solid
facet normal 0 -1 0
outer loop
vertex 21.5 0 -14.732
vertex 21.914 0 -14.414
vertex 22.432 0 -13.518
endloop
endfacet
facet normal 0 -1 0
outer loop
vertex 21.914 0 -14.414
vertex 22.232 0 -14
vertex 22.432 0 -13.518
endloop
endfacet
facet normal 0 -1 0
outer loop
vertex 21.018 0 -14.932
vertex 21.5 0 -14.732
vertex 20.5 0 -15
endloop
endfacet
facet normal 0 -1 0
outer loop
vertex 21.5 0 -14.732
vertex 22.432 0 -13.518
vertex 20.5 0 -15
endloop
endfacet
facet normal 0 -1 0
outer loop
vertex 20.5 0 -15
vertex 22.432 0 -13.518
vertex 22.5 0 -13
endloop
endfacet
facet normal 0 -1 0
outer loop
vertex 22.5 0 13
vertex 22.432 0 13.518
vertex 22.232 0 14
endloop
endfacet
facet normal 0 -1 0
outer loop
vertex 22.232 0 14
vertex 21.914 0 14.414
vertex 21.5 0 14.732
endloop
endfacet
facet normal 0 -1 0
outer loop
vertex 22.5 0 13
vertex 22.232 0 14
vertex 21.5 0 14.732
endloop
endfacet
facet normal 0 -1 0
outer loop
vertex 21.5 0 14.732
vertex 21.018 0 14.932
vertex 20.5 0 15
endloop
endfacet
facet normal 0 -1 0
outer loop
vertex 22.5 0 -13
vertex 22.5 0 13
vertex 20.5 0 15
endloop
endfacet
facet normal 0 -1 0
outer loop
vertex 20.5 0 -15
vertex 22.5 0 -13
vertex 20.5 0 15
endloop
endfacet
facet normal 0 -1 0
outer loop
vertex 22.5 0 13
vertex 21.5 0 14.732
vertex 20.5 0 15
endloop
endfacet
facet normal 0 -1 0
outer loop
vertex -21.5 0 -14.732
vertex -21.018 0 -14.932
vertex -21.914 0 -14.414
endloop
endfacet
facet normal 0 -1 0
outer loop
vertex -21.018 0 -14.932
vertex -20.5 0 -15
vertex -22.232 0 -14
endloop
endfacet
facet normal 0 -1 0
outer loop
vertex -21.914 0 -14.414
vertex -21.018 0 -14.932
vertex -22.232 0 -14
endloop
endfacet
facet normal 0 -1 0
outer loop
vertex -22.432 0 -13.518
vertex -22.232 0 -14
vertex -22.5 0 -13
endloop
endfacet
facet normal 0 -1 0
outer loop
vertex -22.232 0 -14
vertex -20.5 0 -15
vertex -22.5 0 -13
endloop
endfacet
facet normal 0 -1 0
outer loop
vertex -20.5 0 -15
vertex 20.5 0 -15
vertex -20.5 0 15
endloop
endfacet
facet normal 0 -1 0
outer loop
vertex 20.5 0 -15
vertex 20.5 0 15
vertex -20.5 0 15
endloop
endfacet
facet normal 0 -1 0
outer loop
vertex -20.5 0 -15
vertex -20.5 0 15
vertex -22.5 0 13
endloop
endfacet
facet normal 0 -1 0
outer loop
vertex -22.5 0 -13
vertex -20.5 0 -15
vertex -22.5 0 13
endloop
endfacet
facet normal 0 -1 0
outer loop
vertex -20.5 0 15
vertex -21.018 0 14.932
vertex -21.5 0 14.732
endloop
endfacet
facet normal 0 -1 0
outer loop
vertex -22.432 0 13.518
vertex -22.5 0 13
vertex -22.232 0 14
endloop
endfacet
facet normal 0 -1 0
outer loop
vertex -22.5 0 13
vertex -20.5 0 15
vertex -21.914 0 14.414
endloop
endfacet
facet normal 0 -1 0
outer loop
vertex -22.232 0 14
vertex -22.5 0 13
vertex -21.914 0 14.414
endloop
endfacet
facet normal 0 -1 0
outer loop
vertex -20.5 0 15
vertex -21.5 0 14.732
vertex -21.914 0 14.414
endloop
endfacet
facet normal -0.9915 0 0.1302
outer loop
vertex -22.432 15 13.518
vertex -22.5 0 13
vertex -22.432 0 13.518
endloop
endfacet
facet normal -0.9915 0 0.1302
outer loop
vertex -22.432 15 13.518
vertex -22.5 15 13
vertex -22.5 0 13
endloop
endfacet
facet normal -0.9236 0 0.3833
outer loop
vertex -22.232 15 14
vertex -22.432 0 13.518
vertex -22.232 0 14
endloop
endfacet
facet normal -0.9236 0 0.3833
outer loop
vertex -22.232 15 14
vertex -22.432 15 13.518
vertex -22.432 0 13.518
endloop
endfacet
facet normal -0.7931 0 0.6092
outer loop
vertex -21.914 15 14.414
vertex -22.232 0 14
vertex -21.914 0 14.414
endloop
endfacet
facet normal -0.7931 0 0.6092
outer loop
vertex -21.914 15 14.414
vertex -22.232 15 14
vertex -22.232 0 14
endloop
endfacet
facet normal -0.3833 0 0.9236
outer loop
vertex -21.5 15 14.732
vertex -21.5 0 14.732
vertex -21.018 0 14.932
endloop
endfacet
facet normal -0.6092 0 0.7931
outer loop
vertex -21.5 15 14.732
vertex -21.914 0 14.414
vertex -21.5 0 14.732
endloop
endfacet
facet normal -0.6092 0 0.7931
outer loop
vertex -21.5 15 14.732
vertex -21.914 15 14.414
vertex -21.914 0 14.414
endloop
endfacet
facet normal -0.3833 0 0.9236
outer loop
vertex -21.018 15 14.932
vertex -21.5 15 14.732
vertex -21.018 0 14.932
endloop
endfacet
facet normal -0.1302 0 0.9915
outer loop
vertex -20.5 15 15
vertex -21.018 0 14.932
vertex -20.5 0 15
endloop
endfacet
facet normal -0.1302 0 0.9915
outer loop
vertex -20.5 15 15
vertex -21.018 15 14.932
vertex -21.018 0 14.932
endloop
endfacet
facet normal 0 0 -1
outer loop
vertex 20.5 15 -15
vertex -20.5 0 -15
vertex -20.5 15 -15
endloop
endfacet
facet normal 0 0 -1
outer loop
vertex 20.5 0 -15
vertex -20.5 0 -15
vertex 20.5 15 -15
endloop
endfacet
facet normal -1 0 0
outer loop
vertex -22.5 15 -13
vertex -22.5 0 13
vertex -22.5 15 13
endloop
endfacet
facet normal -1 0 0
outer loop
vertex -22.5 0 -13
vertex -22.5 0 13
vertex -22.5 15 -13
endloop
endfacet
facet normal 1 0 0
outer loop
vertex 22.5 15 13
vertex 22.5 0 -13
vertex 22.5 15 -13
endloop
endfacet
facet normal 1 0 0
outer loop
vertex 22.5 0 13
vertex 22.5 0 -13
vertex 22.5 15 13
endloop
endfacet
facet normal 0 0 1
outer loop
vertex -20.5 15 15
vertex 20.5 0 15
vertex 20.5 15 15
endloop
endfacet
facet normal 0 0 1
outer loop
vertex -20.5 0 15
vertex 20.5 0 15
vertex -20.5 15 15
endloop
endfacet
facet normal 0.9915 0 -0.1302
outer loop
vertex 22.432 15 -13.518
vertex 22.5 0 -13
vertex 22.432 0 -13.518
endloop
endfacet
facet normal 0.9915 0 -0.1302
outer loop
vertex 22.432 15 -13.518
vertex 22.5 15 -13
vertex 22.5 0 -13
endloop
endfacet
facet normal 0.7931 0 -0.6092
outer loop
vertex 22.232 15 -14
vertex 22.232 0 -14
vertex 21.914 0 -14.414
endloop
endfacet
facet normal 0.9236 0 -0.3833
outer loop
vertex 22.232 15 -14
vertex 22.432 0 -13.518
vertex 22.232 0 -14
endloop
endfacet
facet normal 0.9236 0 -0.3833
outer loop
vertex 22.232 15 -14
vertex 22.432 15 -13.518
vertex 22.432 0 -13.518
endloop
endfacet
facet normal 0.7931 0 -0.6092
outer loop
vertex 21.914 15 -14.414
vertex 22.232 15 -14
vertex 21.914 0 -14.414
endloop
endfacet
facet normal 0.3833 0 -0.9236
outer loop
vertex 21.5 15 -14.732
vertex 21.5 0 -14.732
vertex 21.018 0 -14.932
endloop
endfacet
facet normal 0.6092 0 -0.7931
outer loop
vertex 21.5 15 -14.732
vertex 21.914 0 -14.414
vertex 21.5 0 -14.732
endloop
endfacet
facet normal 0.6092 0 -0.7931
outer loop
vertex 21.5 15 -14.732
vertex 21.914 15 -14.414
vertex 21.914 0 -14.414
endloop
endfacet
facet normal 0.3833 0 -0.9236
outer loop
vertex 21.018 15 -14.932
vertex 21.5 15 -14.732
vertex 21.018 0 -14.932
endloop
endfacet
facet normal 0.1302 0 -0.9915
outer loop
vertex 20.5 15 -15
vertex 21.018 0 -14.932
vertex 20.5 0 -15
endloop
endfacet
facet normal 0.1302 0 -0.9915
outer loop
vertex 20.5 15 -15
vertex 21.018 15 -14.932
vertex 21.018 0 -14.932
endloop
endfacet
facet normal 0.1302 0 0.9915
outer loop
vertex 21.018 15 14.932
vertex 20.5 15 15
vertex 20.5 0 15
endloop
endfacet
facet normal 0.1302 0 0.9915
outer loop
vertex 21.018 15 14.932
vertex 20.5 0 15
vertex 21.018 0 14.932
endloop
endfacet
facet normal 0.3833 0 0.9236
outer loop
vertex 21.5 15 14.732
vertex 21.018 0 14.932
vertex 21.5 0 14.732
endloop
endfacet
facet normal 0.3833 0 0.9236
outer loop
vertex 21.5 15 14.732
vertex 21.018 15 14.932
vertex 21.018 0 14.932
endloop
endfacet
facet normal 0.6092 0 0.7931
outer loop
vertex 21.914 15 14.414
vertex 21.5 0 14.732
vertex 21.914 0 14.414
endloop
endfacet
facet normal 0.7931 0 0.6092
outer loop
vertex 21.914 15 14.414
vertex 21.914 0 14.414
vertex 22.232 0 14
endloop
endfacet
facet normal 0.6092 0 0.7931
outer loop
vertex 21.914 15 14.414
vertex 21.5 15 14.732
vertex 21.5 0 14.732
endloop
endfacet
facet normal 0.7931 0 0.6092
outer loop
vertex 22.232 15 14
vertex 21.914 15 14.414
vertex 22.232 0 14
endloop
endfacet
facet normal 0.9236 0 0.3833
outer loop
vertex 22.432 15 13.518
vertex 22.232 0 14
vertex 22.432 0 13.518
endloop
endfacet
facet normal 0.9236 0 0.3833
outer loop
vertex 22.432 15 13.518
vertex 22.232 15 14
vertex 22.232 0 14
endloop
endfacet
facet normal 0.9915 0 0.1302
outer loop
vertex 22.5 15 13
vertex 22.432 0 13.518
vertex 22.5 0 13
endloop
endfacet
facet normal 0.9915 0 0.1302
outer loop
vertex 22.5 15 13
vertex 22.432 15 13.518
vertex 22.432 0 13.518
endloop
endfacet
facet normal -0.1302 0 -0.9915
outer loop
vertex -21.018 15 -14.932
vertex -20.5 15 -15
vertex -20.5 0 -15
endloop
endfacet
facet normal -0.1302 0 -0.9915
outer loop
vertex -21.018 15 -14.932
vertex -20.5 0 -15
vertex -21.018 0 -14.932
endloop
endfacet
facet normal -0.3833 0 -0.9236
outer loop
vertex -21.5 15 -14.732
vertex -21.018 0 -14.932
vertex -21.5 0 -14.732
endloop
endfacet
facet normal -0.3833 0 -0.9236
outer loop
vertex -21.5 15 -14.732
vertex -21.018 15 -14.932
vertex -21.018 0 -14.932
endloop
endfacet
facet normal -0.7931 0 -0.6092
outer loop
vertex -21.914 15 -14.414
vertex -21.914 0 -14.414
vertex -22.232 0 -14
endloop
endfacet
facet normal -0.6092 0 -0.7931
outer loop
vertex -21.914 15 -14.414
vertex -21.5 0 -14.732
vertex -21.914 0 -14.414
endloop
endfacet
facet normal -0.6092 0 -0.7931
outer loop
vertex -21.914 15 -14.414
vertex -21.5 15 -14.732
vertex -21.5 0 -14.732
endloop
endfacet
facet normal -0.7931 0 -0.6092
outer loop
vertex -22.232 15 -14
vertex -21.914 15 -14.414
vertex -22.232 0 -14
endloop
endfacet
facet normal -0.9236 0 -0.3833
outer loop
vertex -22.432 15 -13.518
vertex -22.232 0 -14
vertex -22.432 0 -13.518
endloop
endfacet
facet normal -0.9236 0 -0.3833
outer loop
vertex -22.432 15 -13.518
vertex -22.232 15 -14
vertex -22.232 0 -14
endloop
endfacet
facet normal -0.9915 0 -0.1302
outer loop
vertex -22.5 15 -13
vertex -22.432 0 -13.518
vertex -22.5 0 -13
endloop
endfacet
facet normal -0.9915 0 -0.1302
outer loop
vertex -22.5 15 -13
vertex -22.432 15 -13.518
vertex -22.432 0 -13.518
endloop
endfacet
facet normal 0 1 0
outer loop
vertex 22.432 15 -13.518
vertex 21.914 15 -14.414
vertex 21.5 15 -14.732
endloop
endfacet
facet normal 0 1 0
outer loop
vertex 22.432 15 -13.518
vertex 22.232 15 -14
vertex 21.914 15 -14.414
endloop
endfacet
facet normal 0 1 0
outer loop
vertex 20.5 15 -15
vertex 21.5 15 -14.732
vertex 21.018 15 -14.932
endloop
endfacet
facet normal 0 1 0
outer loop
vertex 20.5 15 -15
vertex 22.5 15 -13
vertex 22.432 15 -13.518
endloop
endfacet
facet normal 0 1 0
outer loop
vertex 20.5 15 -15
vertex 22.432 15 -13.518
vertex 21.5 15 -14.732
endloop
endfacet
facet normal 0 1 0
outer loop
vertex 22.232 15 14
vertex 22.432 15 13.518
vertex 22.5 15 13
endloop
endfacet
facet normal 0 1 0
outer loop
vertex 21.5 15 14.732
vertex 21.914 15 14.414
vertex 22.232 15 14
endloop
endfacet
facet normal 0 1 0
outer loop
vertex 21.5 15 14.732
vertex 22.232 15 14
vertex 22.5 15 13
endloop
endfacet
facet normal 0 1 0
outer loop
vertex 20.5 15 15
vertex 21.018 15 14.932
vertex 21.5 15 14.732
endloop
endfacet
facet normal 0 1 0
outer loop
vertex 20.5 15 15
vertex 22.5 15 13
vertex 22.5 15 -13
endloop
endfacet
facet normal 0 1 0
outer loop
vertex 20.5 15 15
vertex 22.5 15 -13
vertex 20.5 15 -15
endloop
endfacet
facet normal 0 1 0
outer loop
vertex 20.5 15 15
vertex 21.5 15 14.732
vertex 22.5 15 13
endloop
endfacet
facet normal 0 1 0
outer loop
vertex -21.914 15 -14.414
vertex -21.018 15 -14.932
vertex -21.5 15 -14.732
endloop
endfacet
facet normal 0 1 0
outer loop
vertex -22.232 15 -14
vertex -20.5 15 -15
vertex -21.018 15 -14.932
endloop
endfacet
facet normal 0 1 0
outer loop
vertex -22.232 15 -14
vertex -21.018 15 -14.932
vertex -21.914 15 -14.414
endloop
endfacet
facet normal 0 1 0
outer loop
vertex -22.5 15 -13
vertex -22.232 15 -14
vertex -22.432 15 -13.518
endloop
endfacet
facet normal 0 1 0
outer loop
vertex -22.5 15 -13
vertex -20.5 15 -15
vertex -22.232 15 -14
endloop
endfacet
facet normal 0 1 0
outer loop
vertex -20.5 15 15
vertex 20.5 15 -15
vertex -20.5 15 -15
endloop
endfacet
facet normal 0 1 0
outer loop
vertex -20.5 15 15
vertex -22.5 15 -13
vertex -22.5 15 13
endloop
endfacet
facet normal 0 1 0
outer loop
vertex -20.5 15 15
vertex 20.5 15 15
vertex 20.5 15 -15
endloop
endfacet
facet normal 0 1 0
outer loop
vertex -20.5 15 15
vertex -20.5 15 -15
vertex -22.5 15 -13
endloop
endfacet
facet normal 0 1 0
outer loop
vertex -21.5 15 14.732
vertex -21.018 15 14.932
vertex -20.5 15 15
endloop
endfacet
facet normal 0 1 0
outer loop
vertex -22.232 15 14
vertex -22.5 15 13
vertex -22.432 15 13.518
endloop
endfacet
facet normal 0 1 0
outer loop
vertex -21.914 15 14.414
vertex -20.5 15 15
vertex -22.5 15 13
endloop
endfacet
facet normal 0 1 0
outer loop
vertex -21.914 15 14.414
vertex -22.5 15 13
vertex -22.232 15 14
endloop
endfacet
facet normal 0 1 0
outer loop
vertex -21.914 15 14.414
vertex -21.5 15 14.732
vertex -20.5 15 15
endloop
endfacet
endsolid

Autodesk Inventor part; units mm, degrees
ref_plane "YZ Plane" through (0, 0, 0) normal (1, 0, 0) x (0, 1, 0)
ref_plane "XZ Plane" through (0, 0, 0) normal (0, 1, 0) x (-1, 0, 0)
ref_plane "XY Plane" through (0, 0, 0) normal (0, 0, 1) x (1, 0, 0)
sketch "Sketch1" plane through (0, 0, 0) normal (0, 1, 0) x (-1, 0, 0)
  line L0 (-22.5, 15) -> (22.5, 15)
  line L1 (22.5, 15) -> (22.5, -15)
  line L2 (22.5, -15) -> (-22.5, -15)
  line L3 (-22.5, -15) -> (-22.5, 15)
  line L4 (-22.5, 15) -> (22.5, -15) construction
  line L5 (22.5, 15) -> (-22.5, -15) construction
  line L6 (31.5, 0) -> (-31.5, 0) construction
  line L7 (0, -21) -> (0, 21) construction
  point P0 (0, 0)
  dimension "d0" = 45
  dimension "d1" = 30
extrude "Extrusion1" add sketch "Sketch1" along normal blind 15
fillet "Fillet1" radius 2 4 edges at (-22.5, 7.5, 15) (-22.5, 7.5, -15) (22.5, 7.5, -15) (22.5, 7.5, 15)
properties part number "TCSM1-15-005" material "Wood (Birch)"
